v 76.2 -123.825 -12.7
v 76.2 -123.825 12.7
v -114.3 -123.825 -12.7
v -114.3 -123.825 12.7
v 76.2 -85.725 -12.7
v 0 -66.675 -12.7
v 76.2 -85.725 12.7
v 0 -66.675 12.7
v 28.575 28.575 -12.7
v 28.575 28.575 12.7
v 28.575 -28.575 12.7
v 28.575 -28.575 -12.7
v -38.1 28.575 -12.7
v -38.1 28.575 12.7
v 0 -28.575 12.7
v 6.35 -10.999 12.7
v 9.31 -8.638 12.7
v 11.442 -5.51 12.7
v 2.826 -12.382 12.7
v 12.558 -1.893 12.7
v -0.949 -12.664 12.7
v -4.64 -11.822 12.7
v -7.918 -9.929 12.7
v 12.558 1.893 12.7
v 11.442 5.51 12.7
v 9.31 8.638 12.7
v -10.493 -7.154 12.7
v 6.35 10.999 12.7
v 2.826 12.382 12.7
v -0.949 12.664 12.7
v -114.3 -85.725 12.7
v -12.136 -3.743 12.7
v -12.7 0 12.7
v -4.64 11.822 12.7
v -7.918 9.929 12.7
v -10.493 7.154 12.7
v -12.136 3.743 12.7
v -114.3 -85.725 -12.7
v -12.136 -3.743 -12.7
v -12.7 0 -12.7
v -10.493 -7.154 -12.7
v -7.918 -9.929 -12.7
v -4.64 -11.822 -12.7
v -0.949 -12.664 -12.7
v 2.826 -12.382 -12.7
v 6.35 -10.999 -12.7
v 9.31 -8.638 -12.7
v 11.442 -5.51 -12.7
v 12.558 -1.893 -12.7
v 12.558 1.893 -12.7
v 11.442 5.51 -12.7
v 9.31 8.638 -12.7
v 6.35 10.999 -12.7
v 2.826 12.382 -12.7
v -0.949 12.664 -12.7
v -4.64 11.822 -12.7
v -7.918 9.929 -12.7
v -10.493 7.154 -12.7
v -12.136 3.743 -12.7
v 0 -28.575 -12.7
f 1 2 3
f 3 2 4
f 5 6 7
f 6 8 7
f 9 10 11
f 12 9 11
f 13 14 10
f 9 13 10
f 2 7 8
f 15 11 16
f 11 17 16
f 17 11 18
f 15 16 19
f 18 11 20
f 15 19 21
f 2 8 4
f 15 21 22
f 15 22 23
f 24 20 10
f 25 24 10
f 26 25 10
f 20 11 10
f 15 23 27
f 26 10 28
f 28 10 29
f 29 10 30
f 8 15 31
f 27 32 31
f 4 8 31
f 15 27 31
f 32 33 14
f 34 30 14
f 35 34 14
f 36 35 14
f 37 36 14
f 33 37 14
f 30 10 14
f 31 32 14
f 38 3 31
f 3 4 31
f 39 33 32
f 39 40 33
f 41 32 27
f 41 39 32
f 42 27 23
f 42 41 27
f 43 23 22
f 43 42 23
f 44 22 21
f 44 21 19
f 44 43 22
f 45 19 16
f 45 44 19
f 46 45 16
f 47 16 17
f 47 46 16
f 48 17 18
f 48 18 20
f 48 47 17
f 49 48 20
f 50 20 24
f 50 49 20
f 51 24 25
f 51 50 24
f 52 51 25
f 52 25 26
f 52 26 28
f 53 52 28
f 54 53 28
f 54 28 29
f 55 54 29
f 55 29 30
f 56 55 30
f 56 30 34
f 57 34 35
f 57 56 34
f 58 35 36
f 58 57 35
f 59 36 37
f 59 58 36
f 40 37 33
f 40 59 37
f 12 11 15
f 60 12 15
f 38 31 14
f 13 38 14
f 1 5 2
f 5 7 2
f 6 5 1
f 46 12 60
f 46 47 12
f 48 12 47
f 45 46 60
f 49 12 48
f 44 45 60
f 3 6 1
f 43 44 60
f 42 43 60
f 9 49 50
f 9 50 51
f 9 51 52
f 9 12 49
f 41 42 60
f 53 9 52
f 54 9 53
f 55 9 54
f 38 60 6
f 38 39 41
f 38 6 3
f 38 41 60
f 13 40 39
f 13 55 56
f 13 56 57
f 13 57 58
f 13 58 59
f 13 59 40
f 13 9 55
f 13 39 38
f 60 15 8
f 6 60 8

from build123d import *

# Parameters (mm, degrees)
SKETCH2_R      = 12.7
EXTRUDE1_DEPTH = 12.7


with BuildPart() as part:
    # Sketch2 → Extrude1 (new, symmetric)
    with BuildSketch(Plane.XY):
        Polygon((0, -28.575), (0, -66.675), (76.2, -85.725), (76.2, -123.825), (-114.3, -123.825), (-114.3, -85.725), (-38.1, 28.575), (28.575, 28.575), (28.575, -28.575), align=None)
        Circle(SKETCH2_R, mode=Mode.SUBTRACT)
    extrude(amount=EXTRUDE1_DEPTH, both=True)


solid = part.part
